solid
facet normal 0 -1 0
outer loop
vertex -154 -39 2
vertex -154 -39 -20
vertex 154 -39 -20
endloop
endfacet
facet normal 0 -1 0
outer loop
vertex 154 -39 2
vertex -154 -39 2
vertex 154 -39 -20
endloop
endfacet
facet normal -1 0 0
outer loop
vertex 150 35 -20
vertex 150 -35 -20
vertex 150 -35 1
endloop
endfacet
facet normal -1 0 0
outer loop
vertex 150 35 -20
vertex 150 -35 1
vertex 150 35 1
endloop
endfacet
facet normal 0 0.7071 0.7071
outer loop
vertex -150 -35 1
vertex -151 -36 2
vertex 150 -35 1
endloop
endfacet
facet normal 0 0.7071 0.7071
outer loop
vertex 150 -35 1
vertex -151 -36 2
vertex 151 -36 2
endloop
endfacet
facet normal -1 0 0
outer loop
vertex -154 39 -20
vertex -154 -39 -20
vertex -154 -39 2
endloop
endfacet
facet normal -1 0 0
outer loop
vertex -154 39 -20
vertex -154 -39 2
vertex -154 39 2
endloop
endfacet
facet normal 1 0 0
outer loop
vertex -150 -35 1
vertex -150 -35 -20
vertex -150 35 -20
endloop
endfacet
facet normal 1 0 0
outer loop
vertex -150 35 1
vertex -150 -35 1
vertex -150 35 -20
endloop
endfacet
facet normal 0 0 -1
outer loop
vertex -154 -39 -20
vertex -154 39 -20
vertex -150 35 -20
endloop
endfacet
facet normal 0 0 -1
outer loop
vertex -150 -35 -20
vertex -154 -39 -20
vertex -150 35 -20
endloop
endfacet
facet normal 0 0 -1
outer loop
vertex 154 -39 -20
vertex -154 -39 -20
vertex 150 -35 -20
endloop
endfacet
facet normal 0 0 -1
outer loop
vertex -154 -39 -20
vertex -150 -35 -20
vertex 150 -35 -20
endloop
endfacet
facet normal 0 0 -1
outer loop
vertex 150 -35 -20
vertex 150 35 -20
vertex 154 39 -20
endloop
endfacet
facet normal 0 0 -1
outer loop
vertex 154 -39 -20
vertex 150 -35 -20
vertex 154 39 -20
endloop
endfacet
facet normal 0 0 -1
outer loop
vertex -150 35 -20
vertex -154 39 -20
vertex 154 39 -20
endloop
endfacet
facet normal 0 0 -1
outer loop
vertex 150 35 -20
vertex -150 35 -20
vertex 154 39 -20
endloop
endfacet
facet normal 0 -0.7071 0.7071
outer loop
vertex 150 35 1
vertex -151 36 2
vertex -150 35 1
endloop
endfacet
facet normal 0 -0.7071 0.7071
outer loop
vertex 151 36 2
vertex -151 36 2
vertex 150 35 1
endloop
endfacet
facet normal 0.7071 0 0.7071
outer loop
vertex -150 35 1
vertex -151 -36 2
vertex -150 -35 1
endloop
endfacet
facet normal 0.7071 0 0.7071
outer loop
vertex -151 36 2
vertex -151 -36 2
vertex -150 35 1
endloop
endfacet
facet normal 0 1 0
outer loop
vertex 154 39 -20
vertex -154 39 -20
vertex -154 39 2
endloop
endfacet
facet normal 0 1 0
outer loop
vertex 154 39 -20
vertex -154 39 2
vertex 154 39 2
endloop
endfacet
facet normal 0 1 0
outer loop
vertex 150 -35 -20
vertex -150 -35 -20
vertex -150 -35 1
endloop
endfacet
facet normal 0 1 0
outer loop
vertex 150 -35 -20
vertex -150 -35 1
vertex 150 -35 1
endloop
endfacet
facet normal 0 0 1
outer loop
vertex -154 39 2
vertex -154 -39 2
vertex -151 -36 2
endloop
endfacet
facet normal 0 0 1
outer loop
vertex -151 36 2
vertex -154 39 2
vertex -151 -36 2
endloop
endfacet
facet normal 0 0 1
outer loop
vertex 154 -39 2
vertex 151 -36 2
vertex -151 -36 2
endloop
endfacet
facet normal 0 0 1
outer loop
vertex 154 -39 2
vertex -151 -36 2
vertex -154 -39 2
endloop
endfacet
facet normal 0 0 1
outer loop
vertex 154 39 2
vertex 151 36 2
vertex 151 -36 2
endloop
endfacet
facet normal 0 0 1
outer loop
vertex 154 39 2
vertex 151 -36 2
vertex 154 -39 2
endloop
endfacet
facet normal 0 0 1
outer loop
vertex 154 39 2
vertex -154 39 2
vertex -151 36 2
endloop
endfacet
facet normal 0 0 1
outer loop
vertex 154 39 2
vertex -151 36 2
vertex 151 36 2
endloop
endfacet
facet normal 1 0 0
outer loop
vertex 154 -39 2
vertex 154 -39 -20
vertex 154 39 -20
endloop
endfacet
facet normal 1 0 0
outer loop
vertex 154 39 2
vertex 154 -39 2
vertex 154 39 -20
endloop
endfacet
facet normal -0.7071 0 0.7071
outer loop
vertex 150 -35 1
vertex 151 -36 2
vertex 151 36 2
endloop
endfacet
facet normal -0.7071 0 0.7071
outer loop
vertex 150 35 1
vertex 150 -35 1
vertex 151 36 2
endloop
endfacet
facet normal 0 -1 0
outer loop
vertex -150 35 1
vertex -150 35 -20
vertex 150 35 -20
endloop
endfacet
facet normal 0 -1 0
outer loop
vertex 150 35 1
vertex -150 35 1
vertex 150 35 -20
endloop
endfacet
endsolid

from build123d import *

# Parameters (mm, degrees)
EXTRUDE_1_DEPTH      = 2
EXTRUDE_1_DEPTH_BACK = 20
SKETCH_1_W           = 308
SKETCH_1_H           = 78
SKETCH_1_W_2         = 300
SKETCH_1_H_2         = 70
CHAMFER_1_SIZE       = 1


with BuildPart() as part:
    # Эскиз1 → Бобышка-Вытянуть1 (new, two sides: drawn at the far end of the back side and taken through both)
    with BuildSketch(Plane.XY.offset(-EXTRUDE_1_DEPTH_BACK)):
        Rectangle(SKETCH_1_W, SKETCH_1_H)
        Rectangle(SKETCH_1_W_2, SKETCH_1_H_2, mode=Mode.SUBTRACT)
    extrude(amount=EXTRUDE_1_DEPTH + EXTRUDE_1_DEPTH_BACK)

    # Фаска1
    chamfer_1_edges = [part.edges().sort_by_distance(p)[0] for p in [
        (-150, 0, 2),
        (0, -35, 2),
        (150, 0, 2),
        (0, 35, 2),
    ]]
    chamfer(chamfer_1_edges, length=CHAMFER_1_SIZE)


solid = part.part
